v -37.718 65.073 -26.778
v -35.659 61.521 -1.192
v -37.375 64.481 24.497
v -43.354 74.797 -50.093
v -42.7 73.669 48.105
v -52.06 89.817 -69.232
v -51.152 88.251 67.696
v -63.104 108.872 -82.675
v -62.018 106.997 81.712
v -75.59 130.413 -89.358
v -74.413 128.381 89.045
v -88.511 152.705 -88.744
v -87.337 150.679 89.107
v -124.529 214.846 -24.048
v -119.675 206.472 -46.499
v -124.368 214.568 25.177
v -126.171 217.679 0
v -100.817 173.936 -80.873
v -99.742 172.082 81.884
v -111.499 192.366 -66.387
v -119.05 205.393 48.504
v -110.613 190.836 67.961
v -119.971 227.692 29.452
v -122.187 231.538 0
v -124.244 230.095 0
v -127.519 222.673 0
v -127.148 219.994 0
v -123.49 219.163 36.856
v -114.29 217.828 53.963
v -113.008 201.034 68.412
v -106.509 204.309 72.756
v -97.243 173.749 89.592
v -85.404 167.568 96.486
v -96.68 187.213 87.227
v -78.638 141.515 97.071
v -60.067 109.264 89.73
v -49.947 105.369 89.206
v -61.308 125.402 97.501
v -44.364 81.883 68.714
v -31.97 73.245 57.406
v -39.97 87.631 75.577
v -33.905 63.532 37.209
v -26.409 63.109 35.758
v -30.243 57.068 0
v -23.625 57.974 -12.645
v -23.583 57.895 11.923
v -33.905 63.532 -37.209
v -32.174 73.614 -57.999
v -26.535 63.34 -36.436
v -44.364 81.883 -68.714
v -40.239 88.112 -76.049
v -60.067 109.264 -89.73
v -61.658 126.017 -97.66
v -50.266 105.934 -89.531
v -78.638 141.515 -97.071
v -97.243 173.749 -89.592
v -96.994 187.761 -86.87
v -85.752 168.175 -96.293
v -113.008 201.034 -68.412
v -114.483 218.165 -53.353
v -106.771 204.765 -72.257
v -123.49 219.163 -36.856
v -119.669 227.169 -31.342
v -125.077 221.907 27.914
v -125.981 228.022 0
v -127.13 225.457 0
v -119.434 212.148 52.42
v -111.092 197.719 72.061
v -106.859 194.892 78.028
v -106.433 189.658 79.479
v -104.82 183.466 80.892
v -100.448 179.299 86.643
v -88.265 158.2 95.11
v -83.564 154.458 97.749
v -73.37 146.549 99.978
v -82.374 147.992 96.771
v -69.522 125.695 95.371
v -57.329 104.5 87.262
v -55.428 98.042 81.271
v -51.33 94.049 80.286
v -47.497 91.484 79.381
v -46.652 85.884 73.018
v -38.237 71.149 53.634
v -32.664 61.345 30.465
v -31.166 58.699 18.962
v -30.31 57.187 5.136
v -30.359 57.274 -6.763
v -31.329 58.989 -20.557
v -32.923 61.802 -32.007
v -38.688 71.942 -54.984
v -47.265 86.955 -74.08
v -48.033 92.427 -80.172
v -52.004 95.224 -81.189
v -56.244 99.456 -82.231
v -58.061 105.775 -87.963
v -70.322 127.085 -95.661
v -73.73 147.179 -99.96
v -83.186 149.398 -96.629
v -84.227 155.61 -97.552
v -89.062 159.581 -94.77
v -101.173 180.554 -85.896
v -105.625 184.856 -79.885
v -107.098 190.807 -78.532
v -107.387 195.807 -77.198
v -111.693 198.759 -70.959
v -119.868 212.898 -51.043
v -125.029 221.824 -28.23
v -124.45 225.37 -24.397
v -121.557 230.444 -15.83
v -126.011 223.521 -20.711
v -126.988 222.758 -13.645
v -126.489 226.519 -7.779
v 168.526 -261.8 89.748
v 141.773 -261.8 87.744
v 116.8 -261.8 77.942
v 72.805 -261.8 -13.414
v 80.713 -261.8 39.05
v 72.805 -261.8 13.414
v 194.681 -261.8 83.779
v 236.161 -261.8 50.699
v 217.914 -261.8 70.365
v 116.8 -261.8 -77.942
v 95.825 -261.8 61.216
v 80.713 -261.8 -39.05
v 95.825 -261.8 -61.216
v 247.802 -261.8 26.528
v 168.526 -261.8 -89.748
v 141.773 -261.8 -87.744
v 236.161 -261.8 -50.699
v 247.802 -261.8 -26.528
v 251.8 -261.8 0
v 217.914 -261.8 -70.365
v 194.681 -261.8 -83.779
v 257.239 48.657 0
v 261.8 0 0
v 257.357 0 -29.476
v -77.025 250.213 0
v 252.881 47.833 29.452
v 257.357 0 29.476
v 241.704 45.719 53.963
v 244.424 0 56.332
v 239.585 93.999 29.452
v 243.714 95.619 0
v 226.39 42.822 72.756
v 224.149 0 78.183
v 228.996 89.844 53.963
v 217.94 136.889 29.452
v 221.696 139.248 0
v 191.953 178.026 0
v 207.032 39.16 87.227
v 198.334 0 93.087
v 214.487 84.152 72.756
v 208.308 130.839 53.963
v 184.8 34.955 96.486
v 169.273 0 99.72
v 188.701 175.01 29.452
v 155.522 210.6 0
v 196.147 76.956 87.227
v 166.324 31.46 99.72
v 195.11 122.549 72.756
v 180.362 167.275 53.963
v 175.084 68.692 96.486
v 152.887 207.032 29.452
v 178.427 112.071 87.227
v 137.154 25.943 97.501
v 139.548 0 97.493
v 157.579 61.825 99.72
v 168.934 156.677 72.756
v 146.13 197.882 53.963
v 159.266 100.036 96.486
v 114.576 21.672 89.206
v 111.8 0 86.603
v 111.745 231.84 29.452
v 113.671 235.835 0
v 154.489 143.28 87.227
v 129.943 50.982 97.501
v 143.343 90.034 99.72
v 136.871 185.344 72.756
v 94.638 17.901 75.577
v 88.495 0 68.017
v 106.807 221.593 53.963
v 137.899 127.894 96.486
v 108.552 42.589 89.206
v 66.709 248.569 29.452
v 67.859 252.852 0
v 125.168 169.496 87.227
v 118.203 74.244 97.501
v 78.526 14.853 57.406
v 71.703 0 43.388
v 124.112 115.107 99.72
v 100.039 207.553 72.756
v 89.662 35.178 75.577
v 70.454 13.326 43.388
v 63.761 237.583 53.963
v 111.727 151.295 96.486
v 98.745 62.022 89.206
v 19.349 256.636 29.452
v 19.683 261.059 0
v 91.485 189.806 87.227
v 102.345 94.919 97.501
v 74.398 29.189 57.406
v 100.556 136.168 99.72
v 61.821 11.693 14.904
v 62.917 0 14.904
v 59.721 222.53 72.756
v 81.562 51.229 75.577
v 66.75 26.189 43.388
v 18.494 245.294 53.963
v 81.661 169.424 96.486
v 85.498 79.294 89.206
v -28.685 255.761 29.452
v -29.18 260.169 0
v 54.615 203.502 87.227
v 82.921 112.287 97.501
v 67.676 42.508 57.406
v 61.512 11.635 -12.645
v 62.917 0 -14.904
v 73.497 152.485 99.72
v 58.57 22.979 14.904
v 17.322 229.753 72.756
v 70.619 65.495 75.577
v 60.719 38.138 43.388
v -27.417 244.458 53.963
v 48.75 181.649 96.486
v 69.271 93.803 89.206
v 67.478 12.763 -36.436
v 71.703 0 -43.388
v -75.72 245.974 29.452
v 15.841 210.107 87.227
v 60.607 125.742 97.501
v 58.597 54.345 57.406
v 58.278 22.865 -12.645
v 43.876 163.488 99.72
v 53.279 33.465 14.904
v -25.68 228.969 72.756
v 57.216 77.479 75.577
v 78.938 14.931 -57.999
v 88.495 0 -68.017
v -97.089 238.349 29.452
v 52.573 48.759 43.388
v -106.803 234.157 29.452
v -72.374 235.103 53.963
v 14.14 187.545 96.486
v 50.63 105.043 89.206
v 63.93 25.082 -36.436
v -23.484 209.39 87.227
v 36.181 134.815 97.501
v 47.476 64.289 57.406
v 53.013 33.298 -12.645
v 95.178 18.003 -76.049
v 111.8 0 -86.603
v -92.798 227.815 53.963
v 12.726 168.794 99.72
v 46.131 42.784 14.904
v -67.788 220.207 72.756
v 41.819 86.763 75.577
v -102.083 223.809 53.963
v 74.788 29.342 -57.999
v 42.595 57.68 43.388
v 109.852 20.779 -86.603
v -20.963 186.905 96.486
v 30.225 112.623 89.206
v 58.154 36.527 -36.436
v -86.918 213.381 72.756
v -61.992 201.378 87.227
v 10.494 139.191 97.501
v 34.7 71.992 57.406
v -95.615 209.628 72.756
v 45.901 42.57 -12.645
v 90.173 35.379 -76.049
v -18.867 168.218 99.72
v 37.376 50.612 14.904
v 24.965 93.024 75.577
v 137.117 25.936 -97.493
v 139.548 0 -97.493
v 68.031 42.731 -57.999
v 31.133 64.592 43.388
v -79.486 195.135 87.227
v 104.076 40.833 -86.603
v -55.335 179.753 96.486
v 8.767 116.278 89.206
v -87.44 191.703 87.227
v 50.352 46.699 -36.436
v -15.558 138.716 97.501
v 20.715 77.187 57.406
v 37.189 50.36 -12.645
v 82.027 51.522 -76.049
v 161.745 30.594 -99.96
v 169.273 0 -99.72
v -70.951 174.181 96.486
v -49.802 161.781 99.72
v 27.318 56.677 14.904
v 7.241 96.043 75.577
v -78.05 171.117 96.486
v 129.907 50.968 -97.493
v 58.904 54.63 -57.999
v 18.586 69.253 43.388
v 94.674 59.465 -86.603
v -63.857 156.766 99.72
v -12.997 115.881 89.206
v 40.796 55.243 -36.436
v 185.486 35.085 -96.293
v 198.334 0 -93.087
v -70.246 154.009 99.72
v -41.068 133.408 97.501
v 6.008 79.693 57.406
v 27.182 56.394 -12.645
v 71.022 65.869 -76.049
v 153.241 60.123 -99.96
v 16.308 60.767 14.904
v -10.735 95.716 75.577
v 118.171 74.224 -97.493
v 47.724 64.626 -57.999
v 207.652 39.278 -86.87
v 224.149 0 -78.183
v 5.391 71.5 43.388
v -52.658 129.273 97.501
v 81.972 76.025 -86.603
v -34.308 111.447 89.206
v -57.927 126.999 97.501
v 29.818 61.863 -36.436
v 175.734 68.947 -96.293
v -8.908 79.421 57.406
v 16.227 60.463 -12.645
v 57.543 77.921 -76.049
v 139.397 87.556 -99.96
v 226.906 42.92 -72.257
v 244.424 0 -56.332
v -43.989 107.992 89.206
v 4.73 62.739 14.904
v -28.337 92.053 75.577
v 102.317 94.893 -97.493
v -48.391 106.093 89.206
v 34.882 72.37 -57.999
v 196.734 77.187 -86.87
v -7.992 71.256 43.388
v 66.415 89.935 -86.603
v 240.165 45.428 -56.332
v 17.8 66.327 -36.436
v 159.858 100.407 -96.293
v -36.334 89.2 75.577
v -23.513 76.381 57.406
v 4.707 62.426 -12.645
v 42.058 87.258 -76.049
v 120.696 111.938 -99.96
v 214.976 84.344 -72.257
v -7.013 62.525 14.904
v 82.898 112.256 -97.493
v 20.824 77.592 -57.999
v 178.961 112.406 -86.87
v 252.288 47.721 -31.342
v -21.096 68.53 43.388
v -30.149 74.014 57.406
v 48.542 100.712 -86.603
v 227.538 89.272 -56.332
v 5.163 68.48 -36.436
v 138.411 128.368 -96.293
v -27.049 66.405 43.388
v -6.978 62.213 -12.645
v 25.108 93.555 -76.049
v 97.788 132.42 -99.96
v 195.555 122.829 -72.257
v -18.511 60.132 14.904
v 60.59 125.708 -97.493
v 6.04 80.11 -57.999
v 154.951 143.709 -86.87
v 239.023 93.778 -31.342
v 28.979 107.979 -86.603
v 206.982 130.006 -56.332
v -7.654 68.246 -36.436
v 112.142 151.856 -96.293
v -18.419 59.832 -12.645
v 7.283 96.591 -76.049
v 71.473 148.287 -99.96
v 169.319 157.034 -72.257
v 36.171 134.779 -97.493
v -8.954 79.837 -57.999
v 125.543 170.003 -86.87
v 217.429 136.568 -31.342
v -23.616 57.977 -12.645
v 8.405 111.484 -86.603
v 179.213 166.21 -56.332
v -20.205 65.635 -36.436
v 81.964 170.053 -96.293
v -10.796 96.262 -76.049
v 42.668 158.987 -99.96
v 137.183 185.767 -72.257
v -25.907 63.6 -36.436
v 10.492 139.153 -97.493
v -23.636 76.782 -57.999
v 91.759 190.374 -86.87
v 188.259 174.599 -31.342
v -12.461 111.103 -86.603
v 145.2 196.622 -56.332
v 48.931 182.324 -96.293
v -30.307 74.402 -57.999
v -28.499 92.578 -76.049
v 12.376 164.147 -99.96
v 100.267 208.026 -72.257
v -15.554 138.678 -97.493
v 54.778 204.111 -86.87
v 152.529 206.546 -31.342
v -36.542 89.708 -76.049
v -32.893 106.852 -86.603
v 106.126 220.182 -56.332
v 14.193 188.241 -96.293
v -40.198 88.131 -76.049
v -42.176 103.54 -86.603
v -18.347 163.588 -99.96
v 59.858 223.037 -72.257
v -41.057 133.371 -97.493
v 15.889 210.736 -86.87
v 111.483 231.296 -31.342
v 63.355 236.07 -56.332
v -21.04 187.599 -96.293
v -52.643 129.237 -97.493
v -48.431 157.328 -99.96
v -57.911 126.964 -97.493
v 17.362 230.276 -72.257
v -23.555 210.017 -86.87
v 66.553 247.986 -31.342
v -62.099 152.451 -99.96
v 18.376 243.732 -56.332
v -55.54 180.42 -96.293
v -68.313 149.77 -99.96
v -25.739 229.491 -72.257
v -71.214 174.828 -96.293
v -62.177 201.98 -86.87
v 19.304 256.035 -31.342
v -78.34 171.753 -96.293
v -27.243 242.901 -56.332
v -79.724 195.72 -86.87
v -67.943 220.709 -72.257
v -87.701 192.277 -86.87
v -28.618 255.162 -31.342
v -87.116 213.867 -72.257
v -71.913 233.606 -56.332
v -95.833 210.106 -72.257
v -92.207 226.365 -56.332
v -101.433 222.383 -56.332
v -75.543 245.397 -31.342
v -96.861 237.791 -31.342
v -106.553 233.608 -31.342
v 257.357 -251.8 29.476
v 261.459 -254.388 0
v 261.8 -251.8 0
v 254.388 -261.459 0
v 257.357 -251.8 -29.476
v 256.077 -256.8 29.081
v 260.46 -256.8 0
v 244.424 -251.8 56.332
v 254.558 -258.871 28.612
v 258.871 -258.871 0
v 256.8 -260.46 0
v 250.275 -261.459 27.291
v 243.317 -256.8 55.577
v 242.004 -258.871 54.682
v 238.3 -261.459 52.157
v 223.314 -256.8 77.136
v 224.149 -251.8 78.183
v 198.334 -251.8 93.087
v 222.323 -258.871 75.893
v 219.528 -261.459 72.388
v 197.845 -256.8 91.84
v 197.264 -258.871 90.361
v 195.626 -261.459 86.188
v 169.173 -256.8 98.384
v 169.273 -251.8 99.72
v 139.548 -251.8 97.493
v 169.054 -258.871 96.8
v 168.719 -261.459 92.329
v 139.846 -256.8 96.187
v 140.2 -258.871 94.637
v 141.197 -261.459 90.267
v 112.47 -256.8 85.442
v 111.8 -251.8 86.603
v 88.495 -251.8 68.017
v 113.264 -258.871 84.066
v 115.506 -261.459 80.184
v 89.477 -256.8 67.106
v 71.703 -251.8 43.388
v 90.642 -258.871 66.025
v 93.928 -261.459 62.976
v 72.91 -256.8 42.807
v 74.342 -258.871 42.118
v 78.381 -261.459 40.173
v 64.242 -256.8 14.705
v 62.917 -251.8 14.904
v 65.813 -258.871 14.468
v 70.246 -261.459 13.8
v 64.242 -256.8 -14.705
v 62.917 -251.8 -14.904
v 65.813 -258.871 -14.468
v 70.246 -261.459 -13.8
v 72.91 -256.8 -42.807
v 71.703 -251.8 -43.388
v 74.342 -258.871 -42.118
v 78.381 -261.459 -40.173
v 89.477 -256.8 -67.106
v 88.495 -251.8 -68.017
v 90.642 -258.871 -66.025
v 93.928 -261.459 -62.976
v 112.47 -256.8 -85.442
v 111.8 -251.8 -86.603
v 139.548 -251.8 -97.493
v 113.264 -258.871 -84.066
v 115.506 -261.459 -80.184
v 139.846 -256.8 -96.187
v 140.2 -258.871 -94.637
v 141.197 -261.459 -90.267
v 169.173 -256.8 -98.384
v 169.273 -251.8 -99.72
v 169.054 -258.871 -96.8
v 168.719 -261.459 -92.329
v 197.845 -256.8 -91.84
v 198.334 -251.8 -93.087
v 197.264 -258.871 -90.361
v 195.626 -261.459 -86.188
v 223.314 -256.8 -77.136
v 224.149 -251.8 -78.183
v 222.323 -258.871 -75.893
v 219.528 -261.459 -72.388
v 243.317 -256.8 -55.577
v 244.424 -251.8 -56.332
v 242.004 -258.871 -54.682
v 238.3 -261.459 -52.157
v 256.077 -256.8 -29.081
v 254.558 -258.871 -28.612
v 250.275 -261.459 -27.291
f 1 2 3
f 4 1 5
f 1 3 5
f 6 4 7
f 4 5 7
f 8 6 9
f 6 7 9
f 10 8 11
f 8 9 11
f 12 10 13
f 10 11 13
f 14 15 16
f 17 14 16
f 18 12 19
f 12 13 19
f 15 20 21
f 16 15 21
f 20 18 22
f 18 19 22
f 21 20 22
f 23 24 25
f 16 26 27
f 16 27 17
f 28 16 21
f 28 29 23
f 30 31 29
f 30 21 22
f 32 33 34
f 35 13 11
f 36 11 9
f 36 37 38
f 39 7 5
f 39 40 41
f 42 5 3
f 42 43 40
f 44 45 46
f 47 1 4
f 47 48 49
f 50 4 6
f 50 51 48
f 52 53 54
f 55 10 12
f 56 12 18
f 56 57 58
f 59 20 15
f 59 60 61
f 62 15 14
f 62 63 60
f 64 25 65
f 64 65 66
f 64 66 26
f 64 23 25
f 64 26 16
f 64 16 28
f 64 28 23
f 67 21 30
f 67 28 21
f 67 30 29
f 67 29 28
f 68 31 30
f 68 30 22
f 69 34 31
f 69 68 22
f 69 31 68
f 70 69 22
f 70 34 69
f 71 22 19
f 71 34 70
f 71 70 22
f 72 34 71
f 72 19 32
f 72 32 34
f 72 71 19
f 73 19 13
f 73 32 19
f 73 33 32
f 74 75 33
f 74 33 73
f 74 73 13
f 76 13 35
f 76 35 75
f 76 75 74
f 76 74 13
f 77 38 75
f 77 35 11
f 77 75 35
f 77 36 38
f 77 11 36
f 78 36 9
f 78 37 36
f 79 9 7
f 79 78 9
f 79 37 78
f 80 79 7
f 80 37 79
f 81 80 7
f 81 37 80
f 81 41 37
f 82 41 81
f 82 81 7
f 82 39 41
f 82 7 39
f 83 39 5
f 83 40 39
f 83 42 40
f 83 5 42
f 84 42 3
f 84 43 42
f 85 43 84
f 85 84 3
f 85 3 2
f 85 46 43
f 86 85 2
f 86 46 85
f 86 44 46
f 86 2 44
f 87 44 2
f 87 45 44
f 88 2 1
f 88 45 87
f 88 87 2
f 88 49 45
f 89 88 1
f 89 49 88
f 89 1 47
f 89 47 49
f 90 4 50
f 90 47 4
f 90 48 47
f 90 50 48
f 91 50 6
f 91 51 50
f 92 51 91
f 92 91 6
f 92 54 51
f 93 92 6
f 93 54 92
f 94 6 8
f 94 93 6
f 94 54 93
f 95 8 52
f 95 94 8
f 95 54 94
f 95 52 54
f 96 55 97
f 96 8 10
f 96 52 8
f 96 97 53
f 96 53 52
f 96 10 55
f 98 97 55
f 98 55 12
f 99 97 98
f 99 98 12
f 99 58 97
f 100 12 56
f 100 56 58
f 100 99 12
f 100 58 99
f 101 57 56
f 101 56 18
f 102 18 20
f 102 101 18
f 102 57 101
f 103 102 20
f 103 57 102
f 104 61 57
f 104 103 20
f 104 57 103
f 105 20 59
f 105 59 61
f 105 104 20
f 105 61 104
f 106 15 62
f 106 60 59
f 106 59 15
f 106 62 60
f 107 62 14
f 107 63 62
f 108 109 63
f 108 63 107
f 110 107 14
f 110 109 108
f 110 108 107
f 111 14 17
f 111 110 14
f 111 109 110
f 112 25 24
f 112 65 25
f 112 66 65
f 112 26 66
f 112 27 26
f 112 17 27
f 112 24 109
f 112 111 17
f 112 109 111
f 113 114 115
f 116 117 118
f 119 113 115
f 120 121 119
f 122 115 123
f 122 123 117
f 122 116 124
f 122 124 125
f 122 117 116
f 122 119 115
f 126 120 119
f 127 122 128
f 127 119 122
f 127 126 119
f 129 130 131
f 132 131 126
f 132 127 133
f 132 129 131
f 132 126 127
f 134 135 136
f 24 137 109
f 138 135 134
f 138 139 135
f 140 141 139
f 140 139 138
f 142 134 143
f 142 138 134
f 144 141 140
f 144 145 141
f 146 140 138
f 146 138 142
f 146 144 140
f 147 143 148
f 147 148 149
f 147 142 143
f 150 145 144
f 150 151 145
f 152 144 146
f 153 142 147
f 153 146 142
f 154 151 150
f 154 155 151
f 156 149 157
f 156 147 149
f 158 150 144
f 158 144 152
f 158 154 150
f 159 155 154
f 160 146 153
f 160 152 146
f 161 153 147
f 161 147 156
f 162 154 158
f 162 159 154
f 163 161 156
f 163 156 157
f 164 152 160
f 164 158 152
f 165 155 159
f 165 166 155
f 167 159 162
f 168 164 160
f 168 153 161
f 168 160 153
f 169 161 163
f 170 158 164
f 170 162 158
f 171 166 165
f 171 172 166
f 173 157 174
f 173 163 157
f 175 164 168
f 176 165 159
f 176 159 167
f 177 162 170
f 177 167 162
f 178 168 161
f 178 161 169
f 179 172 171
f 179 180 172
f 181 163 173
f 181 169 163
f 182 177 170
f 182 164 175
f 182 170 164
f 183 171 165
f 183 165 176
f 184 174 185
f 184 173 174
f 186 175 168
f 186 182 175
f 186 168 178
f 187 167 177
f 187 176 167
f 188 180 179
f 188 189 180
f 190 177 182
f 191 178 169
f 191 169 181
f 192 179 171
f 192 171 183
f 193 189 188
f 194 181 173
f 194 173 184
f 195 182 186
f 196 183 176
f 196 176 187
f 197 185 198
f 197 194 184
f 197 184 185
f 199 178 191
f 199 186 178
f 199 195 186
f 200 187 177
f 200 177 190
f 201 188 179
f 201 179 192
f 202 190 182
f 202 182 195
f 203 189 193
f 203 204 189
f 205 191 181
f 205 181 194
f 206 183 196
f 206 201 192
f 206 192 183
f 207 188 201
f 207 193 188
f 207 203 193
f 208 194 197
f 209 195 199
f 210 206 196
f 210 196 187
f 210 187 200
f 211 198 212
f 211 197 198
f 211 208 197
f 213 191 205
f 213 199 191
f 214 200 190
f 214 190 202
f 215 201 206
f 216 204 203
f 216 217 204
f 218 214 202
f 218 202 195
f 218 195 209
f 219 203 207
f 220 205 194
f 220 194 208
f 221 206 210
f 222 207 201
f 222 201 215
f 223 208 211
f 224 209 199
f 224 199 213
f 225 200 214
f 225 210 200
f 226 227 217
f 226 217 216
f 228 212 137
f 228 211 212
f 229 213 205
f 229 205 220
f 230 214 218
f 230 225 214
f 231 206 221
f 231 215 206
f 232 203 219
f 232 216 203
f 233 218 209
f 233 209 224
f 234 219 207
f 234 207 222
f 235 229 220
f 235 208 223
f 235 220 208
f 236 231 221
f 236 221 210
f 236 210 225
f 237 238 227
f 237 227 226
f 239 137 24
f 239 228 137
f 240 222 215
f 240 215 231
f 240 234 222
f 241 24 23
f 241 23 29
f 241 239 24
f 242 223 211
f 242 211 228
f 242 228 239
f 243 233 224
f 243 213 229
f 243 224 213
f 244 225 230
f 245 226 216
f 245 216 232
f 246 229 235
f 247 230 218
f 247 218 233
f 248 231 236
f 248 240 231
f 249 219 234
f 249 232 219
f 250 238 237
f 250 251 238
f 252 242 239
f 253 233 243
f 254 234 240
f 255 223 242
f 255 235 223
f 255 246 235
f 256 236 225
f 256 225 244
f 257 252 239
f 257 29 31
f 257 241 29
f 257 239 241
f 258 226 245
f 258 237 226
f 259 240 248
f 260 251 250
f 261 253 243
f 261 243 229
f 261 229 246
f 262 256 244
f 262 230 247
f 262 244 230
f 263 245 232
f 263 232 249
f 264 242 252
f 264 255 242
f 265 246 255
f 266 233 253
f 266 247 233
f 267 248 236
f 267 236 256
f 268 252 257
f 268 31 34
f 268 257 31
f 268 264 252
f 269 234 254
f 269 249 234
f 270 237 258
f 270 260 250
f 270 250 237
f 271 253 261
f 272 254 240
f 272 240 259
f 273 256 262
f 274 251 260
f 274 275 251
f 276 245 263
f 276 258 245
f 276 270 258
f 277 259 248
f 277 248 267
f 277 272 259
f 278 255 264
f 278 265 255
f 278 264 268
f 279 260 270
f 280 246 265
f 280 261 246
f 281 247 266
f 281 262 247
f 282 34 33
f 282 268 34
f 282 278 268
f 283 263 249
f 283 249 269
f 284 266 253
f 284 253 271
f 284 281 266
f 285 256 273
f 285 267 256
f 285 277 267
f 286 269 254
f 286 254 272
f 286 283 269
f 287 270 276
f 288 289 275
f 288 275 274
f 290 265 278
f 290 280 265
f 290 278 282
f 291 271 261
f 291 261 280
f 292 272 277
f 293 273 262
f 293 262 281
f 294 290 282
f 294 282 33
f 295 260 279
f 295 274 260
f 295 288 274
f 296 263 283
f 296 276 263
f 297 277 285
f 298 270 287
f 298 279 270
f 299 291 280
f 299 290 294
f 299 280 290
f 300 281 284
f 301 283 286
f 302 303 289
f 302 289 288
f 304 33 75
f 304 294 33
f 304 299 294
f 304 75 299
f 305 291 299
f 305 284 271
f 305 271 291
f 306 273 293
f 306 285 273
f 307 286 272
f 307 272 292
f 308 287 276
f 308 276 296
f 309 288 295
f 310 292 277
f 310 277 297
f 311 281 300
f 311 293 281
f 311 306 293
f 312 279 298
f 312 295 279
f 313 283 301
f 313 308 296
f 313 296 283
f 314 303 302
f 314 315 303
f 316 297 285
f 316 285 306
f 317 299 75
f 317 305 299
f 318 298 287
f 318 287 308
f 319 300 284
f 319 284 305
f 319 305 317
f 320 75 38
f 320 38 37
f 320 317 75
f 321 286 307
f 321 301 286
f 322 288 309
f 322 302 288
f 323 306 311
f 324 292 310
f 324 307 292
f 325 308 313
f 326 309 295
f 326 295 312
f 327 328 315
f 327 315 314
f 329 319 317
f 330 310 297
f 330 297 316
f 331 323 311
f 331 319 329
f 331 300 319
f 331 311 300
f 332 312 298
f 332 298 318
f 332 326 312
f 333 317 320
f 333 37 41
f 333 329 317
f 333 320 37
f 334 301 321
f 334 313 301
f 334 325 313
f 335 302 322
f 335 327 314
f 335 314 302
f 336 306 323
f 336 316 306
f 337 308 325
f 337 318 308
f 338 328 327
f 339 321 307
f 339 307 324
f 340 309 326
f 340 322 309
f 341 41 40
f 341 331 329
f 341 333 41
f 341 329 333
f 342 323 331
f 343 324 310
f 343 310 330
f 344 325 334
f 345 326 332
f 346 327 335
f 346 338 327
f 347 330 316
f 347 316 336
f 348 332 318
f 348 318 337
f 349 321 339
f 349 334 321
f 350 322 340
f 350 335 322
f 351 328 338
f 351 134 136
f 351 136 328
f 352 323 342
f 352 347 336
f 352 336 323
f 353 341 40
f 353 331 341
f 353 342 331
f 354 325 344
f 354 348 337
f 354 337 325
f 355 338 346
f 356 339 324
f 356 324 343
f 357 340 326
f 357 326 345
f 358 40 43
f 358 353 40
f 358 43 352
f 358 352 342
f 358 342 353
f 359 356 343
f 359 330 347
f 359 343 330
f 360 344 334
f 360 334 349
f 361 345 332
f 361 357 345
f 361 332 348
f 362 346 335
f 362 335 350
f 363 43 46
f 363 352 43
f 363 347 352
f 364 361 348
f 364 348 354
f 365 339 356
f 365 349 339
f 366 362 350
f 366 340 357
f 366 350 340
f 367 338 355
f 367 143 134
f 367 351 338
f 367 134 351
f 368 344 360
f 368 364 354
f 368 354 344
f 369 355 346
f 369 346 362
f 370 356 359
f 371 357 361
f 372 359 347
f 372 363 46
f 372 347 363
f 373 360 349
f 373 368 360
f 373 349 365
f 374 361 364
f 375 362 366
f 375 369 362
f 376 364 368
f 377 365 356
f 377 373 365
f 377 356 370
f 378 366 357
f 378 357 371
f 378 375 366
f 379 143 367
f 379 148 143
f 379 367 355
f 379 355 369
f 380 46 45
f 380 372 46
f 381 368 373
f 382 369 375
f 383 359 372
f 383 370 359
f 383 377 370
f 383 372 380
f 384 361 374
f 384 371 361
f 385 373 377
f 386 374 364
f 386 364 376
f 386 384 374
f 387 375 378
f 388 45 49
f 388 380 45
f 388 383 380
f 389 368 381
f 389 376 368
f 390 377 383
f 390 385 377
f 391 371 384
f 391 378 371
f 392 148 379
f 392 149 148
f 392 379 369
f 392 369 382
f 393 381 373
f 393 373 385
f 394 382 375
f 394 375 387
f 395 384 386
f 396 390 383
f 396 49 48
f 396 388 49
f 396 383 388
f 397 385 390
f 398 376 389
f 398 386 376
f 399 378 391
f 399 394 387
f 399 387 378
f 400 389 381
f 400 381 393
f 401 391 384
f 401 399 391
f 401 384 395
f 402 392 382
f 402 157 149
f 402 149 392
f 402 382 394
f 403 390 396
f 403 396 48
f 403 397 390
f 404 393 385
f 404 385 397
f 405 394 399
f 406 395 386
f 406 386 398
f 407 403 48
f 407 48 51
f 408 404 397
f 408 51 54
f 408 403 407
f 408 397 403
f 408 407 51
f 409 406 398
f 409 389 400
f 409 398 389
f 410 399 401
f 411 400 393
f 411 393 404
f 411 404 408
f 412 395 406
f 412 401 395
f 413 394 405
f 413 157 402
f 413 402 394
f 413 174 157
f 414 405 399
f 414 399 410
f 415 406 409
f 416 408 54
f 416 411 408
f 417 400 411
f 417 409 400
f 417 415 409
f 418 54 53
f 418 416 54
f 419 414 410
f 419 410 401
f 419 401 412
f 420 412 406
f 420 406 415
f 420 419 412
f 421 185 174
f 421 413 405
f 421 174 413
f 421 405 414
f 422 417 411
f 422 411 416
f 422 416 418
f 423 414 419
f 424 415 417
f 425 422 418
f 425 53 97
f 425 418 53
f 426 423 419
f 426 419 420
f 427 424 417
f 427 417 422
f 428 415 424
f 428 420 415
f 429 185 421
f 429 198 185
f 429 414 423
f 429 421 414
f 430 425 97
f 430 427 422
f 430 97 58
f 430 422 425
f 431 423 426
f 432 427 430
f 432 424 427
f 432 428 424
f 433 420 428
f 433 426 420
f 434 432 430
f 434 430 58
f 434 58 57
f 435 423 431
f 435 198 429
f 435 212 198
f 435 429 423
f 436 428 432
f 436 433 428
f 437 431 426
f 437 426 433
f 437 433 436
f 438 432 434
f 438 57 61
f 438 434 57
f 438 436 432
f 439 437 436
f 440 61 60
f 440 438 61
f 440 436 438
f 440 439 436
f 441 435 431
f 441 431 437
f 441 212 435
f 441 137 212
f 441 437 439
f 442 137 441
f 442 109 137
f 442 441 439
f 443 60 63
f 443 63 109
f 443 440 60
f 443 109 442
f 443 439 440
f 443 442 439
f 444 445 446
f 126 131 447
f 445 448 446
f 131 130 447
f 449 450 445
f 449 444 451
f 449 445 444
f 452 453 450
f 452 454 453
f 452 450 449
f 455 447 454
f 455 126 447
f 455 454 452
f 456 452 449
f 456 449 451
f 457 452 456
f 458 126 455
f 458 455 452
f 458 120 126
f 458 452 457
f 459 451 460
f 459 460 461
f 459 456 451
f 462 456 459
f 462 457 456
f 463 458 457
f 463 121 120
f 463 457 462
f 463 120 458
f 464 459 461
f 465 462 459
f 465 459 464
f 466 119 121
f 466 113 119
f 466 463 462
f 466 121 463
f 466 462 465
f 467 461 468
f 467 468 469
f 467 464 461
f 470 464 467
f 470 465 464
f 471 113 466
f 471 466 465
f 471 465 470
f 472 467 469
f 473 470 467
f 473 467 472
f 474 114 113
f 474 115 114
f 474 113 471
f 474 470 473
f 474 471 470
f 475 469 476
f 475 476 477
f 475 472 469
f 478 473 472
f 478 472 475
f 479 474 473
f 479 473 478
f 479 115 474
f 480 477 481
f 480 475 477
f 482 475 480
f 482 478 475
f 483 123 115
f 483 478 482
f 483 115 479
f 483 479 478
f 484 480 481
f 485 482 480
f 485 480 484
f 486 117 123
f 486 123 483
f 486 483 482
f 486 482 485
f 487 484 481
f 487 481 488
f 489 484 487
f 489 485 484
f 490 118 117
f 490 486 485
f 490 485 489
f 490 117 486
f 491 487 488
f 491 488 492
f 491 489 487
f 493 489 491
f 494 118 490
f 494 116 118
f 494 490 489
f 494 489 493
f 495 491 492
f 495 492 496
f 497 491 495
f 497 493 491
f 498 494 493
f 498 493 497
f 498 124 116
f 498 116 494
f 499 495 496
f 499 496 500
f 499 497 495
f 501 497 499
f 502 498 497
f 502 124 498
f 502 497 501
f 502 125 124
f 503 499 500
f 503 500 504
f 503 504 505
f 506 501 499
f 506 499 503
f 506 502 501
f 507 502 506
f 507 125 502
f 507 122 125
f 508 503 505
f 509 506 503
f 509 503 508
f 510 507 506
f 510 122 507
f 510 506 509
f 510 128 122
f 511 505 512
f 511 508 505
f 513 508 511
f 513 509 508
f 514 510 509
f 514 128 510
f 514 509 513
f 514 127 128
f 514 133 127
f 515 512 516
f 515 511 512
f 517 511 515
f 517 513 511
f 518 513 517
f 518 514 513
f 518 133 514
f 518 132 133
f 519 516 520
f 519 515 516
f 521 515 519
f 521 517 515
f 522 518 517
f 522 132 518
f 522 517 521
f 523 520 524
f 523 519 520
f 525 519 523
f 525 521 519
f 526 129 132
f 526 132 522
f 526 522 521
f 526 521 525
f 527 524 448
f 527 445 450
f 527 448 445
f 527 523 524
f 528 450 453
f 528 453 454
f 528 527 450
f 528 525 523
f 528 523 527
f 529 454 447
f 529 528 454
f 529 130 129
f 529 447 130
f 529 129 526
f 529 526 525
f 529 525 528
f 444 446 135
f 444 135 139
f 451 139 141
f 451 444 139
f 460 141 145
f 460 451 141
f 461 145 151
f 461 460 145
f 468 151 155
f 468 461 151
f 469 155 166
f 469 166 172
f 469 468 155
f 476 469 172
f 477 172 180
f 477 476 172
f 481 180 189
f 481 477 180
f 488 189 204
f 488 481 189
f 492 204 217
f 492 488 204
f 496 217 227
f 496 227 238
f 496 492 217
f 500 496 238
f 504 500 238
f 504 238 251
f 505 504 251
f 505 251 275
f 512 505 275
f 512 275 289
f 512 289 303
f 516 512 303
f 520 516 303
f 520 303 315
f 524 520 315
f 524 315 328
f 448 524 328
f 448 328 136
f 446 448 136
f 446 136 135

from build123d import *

# Parameters (mm, degrees)
F1_R      = 100
F2_FACE_R = 100
F4_R      = 158.537666862
F4_R_2    = 100
F5_DEPTH  = 261
F6_R      = 10
F7_R      = 10


with BuildPart() as f2:
    # F2: sweep along a path in F0
    with BuildLine(Plane.XY) as f2_path:
        ThreePointArc((161.8, 0), (80.7807923206, 140.1916673417), (-81.1382397041, 139.9850922696))
    # F1 (on Front) → F2 (sweep)
    with BuildSketch(Plane.XZ):
        with Locations((161.8, 0)):
            Circle(F1_R)
    sweep(path=f2_path.line)

    # F3: sweep along a path in F0
    with BuildLine(Plane.XY) as f3_path:
        Line((161.8, 0), (161.8, -261.8))
    # F2_face (on face) → F3 (sweep)
    with BuildSketch(Plane(origin=(161.8, 0, 0), x_dir=(1, 0, 0), z_dir=(0, -1, 0))):
        Circle(F2_FACE_R)
    sweep(path=f3_path.line)

    # F4 (on face) → F5 (cut)
    with BuildSketch(Plane.XZ.offset(261.8)):
        with Locations((161.8, 0)):
            Circle(F4_R)
        with Locations((161.8, 0)):
            Circle(F4_R_2, mode=Mode.SUBTRACT)
    extrude(amount=-F5_DEPTH, mode=Mode.SUBTRACT)

    # F6
    f6_edges = [f2.edges().sort_by_distance(p)[0] for p in [
        (61.8, 0, 0),
        (61.8, -261.8, 0),
        (261.8, -130.9, 0),
    ]]
    fillet(f6_edges, radius=F6_R)

    # F7
    f7_edges = [f2.edges().sort_by_distance(p)[0] for p in [
        (-30.990996, 53.46773, 0),
    ]]
    fillet(f7_edges, radius=F7_R)


solid = f2.part
